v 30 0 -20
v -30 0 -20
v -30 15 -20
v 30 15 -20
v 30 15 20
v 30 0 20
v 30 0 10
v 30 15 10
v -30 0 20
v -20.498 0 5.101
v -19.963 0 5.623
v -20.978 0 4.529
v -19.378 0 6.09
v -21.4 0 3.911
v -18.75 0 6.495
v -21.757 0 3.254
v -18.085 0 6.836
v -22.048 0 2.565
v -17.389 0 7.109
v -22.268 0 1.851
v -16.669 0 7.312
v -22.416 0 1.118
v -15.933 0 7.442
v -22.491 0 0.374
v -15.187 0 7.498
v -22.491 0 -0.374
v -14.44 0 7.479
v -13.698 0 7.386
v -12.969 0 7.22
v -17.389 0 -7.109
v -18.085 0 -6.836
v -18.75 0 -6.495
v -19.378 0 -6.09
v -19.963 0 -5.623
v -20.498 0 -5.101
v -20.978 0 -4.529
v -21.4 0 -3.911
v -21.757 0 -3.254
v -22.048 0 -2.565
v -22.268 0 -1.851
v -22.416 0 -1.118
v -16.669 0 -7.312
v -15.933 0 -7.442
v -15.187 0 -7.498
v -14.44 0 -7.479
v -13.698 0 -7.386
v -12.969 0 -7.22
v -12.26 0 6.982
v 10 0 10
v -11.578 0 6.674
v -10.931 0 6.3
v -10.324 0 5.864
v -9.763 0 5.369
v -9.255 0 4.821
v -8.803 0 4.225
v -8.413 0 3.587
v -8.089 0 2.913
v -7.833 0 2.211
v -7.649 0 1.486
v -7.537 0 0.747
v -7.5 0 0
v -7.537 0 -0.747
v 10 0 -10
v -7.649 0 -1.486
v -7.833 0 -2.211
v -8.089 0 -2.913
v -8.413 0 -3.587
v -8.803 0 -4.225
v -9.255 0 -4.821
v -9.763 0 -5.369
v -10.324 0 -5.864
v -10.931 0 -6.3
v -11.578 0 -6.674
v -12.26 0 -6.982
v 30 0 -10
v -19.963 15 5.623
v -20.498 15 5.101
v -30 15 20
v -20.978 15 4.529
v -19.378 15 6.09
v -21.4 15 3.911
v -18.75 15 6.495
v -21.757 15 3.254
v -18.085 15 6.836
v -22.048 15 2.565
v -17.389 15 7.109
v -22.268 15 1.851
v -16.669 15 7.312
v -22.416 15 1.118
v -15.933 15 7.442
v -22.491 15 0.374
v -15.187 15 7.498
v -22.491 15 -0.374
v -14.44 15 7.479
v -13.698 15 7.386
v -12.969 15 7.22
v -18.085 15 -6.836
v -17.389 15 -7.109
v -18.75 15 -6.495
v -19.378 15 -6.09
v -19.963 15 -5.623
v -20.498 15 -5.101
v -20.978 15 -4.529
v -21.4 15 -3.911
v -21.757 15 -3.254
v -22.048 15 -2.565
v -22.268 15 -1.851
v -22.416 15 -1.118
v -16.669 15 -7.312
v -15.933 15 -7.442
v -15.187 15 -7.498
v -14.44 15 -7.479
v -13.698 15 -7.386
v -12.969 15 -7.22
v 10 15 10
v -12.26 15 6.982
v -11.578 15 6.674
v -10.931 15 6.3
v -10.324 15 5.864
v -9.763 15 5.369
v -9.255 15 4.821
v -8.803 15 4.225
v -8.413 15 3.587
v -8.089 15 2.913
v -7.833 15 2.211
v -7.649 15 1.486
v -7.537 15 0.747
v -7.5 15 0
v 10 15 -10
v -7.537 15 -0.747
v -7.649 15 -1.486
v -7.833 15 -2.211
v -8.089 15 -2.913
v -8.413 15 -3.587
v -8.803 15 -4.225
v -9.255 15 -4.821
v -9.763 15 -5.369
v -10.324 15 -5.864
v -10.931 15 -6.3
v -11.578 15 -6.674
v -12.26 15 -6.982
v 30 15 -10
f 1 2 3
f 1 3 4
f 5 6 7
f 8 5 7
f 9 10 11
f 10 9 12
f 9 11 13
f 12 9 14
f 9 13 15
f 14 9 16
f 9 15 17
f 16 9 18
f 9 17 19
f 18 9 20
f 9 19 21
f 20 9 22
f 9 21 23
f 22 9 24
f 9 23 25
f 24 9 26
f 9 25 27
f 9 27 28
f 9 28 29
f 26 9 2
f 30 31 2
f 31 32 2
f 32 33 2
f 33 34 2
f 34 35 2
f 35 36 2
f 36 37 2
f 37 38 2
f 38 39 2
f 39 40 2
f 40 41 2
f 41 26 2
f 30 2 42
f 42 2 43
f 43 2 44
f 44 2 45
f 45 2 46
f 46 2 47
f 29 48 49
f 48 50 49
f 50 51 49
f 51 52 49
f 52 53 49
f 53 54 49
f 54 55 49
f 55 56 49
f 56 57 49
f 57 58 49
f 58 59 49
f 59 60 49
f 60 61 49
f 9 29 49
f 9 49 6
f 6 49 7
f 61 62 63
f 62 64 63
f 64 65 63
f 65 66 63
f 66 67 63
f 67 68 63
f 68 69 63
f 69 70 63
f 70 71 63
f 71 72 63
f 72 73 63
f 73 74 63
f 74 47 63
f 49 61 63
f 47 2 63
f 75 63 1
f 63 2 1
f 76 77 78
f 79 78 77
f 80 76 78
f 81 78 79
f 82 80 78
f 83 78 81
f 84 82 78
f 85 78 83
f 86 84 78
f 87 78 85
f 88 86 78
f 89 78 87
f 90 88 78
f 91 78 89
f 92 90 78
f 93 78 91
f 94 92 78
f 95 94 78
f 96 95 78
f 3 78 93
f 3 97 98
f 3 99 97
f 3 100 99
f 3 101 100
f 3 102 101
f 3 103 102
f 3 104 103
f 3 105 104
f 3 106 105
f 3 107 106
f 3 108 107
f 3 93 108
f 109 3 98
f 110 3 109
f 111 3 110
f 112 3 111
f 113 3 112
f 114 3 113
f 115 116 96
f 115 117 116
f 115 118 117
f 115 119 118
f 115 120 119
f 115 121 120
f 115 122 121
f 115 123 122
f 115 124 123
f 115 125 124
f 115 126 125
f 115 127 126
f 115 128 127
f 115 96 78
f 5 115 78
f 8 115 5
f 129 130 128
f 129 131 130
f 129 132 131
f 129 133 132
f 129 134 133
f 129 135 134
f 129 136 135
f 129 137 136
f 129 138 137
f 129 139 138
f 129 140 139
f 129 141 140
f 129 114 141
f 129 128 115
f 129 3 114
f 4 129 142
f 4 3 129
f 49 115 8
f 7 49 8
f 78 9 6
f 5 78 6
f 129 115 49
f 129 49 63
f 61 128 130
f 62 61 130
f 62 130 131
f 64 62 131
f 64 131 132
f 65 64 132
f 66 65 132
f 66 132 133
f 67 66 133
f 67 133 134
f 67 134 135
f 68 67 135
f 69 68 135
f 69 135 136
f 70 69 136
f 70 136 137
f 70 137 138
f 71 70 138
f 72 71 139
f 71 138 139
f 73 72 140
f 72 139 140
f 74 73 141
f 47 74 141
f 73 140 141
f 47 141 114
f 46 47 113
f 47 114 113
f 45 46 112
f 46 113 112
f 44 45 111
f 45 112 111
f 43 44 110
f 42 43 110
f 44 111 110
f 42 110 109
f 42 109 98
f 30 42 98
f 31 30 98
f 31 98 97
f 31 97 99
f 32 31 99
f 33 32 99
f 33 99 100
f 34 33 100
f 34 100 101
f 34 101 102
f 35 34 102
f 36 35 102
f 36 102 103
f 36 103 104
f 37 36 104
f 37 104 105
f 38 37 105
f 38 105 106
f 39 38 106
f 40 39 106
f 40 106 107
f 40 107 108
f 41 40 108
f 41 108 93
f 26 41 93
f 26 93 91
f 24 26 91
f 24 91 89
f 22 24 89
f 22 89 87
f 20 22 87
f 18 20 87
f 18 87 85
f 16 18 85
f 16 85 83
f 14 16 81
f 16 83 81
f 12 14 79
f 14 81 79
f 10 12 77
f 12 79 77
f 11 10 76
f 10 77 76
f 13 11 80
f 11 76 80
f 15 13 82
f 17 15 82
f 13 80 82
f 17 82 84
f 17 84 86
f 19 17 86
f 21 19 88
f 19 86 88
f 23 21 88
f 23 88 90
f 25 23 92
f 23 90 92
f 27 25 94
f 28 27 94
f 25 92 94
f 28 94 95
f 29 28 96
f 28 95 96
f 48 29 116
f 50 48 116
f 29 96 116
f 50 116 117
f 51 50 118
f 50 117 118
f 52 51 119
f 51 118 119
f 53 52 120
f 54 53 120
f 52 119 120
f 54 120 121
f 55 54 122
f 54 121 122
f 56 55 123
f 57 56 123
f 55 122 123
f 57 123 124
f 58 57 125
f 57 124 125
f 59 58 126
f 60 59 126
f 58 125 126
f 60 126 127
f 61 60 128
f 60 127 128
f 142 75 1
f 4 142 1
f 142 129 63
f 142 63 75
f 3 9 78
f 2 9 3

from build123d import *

# Parameters (mm, degrees)
SKETCH1_W           = 60
SKETCH1_H           = 40
BOSS_EXTRUDE1_DEPTH = 15
CUT_EXTRUDE1_REACH  = 17
SKETCH2_R           = 7.5
CUT_EXTRUDE2_REACH  = 17
SKETCH3_W           = 20
SKETCH3_H           = 20


with BuildPart() as part:
    # Sketch1 → Boss-Extrude1 (new body)
    with BuildSketch(Plane(origin=(0, 0, 0), x_dir=(1, 0, 0), z_dir=(0, 1, 0))):
        Rectangle(SKETCH1_W, SKETCH1_H)
    extrude(amount=BOSS_EXTRUDE1_DEPTH)

    # Sketch2 → Cut-Extrude1 (cut, up to next)
    with BuildSketch(Plane(origin=(0, 15, 0), x_dir=(1, 0, 0), z_dir=(0, 1, 0)), mode=Mode.PRIVATE) as cut_extrude1_sk1:
        with Locations((-15, 0)):
            Circle(SKETCH2_R)
    cut_extrude1_tool1 = extrude(cut_extrude1_sk1.sketch, amount=-CUT_EXTRUDE1_REACH, mode=Mode.PRIVATE) & part.part
    add(cut_extrude1_tool1.solids().sort_by_distance((-15, 15, 0))[0], mode=Mode.SUBTRACT)

    # Sketch3 → Cut-Extrude2 (cut, up to next)
    with BuildSketch(Plane(origin=(0, 15, 0), x_dir=(1, 0, 0), z_dir=(0, 1, 0)), mode=Mode.PRIVATE) as cut_extrude2_sk1:
        with Locations((20, 0)):
            Rectangle(SKETCH3_W, SKETCH3_H)
    cut_extrude2_tool1 = extrude(cut_extrude2_sk1.sketch, amount=-CUT_EXTRUDE2_REACH, mode=Mode.PRIVATE) & part.part
    add(cut_extrude2_tool1.solids().sort_by_distance((20, 15, 0))[0], mode=Mode.SUBTRACT)


solid = part.part
